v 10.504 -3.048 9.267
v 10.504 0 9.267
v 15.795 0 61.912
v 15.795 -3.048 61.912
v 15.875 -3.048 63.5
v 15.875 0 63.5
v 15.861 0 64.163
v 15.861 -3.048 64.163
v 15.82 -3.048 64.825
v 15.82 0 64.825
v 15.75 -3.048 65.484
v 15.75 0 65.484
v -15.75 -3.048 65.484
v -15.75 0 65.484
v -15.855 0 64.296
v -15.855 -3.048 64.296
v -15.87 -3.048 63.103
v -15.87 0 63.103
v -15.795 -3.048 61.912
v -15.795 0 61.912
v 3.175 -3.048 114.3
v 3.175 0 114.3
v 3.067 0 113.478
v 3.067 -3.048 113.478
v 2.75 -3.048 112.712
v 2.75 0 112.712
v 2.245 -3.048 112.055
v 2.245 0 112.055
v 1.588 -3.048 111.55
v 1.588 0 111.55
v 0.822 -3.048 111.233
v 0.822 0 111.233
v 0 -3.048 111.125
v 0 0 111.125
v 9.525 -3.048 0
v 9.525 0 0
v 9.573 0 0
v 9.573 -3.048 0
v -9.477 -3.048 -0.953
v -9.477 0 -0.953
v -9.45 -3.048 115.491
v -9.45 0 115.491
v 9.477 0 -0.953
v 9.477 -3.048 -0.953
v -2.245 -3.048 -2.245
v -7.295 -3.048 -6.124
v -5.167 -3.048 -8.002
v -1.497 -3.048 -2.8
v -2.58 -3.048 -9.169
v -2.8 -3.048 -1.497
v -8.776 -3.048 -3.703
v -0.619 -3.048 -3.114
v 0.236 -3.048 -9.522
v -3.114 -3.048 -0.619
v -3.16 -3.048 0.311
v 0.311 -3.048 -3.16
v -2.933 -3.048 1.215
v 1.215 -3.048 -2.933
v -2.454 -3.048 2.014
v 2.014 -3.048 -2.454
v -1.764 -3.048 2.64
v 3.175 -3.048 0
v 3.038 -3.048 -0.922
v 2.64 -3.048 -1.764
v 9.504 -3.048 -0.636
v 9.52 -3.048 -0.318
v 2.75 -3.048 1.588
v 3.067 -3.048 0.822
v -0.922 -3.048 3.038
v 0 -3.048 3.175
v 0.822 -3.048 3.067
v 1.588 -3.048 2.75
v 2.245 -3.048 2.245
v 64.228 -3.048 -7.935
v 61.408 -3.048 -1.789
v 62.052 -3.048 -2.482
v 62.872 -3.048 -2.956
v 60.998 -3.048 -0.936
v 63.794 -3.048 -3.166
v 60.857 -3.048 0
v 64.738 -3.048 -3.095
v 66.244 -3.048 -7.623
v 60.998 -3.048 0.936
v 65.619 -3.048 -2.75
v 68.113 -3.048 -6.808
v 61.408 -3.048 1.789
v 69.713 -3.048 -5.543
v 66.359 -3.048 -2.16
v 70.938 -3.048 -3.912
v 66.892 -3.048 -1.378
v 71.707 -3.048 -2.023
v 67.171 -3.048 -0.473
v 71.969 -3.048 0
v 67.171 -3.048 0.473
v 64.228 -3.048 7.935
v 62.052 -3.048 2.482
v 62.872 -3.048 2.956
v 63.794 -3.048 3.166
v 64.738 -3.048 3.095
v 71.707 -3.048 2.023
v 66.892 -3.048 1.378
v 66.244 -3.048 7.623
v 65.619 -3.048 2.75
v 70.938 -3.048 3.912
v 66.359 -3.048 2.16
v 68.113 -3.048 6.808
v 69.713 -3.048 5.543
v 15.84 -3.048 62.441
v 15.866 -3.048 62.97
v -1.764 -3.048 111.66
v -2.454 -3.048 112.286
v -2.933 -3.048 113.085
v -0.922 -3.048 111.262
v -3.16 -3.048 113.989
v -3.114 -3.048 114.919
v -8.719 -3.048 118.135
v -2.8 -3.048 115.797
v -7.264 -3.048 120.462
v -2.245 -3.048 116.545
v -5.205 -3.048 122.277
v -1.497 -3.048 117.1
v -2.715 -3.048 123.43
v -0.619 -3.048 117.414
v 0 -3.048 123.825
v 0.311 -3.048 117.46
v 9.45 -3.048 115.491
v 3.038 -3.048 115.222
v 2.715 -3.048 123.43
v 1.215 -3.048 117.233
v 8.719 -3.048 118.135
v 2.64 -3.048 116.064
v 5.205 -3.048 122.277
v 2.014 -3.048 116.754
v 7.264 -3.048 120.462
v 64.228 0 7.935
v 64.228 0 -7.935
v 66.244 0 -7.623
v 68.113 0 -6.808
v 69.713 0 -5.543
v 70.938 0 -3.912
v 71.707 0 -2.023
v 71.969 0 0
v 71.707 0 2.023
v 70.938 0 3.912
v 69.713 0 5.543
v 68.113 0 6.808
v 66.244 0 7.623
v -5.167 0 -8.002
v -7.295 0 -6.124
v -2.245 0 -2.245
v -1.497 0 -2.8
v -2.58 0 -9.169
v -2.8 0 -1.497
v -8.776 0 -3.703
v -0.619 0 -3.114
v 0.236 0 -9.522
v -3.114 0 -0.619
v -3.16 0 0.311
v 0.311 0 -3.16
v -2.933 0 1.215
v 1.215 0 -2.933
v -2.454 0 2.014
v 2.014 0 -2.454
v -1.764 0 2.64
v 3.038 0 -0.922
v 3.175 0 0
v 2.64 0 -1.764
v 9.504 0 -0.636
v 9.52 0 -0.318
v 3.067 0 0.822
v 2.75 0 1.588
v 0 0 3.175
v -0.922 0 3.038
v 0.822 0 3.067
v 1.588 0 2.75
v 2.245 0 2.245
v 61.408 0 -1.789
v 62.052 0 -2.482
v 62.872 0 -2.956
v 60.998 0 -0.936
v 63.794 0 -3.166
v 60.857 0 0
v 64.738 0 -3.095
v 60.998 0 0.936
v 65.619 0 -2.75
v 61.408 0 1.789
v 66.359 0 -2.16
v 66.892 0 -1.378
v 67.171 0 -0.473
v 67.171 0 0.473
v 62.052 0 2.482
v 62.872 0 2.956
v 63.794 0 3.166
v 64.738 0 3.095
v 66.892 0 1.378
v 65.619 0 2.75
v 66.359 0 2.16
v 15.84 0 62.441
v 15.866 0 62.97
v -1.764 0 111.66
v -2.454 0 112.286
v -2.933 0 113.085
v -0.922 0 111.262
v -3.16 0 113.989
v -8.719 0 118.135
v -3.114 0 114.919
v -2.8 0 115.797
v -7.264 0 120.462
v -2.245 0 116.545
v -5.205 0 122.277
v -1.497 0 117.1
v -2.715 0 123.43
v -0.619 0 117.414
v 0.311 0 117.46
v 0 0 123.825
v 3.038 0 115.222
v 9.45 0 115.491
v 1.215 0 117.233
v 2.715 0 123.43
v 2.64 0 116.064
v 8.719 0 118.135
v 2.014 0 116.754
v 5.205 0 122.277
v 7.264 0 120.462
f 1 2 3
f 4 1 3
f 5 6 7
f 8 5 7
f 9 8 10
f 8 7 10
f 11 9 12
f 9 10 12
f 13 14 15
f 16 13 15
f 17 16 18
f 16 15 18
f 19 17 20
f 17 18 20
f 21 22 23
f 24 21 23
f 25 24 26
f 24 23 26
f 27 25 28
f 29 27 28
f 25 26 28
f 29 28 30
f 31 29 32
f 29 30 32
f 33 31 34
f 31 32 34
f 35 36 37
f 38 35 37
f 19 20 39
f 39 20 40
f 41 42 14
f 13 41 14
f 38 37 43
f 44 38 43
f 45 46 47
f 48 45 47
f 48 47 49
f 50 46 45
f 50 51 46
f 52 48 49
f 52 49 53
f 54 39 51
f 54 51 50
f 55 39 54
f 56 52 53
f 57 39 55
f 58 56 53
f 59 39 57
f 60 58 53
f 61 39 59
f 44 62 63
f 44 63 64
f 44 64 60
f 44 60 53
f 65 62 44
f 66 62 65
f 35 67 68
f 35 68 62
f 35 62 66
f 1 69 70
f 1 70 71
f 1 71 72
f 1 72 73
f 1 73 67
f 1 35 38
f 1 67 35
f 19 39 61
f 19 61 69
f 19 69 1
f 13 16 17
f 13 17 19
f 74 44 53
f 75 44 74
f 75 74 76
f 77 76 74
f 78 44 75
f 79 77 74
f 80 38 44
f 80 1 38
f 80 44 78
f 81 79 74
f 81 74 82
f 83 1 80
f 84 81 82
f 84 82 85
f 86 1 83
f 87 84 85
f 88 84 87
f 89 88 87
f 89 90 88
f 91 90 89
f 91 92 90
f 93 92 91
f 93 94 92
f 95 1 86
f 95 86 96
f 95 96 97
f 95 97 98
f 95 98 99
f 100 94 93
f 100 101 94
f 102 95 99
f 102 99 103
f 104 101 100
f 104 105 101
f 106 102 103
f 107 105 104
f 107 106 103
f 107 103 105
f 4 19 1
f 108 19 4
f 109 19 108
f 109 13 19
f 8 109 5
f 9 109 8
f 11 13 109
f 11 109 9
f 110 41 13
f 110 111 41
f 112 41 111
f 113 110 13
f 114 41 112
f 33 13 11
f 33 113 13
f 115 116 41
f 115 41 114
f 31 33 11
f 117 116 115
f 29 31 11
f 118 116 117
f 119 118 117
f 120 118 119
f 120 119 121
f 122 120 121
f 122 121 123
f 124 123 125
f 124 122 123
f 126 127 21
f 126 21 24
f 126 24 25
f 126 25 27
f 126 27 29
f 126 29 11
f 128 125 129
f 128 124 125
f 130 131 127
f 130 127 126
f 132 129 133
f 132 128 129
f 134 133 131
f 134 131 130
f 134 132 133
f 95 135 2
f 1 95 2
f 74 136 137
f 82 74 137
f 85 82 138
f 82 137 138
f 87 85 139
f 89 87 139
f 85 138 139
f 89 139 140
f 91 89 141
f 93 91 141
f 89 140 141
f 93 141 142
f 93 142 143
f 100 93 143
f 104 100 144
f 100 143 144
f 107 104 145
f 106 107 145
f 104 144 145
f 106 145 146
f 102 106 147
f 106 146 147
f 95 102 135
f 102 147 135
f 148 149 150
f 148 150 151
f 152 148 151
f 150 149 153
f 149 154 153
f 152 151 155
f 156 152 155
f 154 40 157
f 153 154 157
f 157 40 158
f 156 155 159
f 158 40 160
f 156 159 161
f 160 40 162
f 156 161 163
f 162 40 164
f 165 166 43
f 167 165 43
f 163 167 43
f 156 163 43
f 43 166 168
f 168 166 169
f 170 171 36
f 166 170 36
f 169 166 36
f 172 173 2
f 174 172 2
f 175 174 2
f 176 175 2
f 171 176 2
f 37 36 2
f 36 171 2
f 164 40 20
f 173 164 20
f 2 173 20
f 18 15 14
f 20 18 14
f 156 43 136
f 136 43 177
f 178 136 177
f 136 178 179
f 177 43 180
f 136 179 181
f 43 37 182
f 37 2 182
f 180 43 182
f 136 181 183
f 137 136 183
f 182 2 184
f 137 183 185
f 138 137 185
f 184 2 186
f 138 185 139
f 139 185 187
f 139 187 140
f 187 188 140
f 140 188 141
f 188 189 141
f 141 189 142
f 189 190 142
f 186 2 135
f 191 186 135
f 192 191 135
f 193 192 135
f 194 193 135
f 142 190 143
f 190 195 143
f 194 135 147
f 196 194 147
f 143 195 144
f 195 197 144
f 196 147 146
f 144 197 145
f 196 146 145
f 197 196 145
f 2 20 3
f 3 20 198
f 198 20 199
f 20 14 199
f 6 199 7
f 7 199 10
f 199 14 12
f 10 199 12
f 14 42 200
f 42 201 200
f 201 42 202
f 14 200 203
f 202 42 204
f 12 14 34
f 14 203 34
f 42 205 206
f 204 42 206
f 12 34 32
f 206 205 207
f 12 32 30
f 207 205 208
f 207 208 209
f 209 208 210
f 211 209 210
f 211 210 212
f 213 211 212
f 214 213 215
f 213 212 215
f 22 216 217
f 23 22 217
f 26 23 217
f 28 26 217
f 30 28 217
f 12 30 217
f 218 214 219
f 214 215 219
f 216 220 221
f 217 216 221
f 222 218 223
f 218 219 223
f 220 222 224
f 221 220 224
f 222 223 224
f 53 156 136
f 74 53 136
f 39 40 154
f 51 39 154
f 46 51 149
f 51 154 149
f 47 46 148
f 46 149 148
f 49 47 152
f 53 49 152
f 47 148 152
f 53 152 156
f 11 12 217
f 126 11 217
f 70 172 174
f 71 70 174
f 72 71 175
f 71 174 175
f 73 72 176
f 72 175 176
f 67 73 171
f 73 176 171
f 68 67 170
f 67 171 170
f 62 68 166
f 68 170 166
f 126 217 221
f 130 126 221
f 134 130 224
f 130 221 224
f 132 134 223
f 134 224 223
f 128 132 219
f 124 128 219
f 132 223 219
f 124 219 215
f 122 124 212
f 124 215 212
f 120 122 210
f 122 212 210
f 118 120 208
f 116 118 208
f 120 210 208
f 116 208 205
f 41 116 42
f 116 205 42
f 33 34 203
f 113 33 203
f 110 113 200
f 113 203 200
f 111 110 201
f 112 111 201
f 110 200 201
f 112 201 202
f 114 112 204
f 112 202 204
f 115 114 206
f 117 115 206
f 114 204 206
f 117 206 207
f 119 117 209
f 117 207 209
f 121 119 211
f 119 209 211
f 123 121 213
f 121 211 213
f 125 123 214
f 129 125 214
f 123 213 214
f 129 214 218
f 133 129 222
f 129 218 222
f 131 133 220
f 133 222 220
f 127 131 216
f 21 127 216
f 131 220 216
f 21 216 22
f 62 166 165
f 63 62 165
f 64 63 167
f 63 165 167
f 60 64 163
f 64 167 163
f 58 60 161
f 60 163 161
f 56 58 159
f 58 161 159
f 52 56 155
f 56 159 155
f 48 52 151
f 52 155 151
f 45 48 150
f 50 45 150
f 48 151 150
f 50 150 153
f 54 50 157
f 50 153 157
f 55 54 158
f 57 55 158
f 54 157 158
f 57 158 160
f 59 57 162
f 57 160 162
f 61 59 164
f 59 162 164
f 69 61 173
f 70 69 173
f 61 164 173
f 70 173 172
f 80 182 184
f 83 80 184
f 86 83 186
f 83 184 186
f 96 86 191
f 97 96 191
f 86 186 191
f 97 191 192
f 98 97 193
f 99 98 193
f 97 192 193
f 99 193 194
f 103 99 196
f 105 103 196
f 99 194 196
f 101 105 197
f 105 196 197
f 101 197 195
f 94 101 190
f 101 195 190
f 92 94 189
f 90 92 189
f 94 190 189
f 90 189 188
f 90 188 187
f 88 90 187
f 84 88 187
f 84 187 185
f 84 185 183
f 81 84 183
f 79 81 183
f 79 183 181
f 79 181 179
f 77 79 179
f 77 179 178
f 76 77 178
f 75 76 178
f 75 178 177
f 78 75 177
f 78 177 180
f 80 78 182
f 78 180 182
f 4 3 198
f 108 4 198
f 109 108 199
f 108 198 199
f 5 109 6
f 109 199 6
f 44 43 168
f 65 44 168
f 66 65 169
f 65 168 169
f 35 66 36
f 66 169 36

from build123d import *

# Parameters (mm, degrees)
F1_DEPTH = 3.048


with BuildPart() as f1:
    # F0 (on Front) → F1 (new body)
    with BuildSketch(Plane.XZ):
        with BuildLine():
            Line((0, 79.375), (0, 104.775))
            ThreePointArc((0, 104.775), (-7.14375, 107.9998046905), (-9.4502929642, 115.490625))
            Line((-9.4502929642, 115.490625), (-15.7504882737, 65.484375))
            ThreePointArc((-15.7504882737, 65.484375), (-10.5003255158, 75.40625), (0, 79.375))
        make_face()
        with BuildLine():
            ThreePointArc((9.525, 114.3), (6.7351920908, 107.5648079092), (0, 104.775))
            Line((0, 104.775), (0, 79.375))
            ThreePointArc((0, 79.375), (10.5003255158, 75.40625), (15.7504882737, 65.484375))
            Line((15.7504882737, 65.484375), (9.4502929642, 115.490625))
            ThreePointArc((9.4502929642, 115.490625), (9.5063048942, 114.896483242), (9.525, 114.3))
        make_face()
        with BuildLine():
            ThreePointArc((15.7504882737, 65.484375), (10.5003255158, 75.40625), (0, 79.375))
            Line((0, 79.375), (0, 47.625))
            ThreePointArc((0, 47.625), (10.6492737428, 51.7267849017), (15.7954255641, 61.9125))
            ThreePointArc((15.7954255641, 61.9125), (15.8550939106, 62.7052534459), (15.875, 63.5))
            ThreePointArc((15.875, 63.5), (15.8438414904, 64.4941387366), (15.7504882737, 65.484375))
        make_face()
        with BuildLine():
            Line((0, 47.625), (0, 79.375))
            ThreePointArc((0, 79.375), (-10.5003255158, 75.40625), (-15.7504882737, 65.484375))
            ThreePointArc((-15.7504882737, 65.484375), (-15.8737438155, 63.6997054867), (-15.7954255641, 61.9125))
            ThreePointArc((-15.7954255641, 61.9125), (-10.6492737428, 51.7267849017), (0, 47.625))
        make_face()
        with BuildLine():
            Line((0, 9.525), (0, 47.625))
            ThreePointArc((0, 47.625), (-10.6492737428, 51.7267849017), (-15.7954255641, 61.9125))
            Line((-15.7954255641, 61.9125), (-9.4772553384, -0.9525))
            ThreePointArc((-9.4772553384, -0.9525), (-7.063929059, 6.3895642457), (0, 9.525))
        make_face()
        with BuildLine():
            ThreePointArc((-9.4502929642, 115.490625), (-7.14375, 107.9998046905), (0, 104.775))
            ThreePointArc((0, 104.775), (6.7351920908, 107.5648079092), (9.525, 114.3))
            ThreePointArc((9.525, 114.3), (9.5063048942, 114.896483242), (9.4502929642, 115.490625))
            ThreePointArc((9.4502929642, 115.490625), (0, 123.825), (-9.4502929642, 115.490625))
        make_face()
        with BuildLine():
            ThreePointArc((3.175, 114.3), (2.2450640303, 112.0549359697), (0, 111.125))
            ThreePointArc((0, 111.125), (-2.2450640303, 116.5450640303), (3.175, 114.3))
        make_face(mode=Mode.SUBTRACT)
        with BuildLine():
            ThreePointArc((71.9691688256, 0), (69.7134786398, 5.5426476963), (64.228458656, 7.935060177))
            ThreePointArc((64.228458656, 7.935060177), (58.4890211293, 5.6818098142), (56.0941688256, 0))
            ThreePointArc((56.0941688256, 0), (58.4890211293, -5.6818098142), (64.228458656, -7.935060177))
            ThreePointArc((64.228458656, -7.935060177), (69.7134786398, -5.5426476963), (71.9691688256, 0))
        make_face()
        with BuildLine():
            ThreePointArc((67.2066688256, 0), (64.0316688256, -3.175), (60.8566688256, 0))
            ThreePointArc((60.8566688256, 0), (64.0316688256, 3.175), (67.2066688256, 0))
        make_face(mode=Mode.SUBTRACT)
        with BuildLine():
            ThreePointArc((15.7954255641, 61.9125), (10.6492737428, 51.7267849017), (0, 47.625))
            Line((0, 47.625), (0, 9.525))
            ThreePointArc((0, 9.525), (0.1180829727, 9.524268025), (0.2361477965, 9.5220722124))
            Line((0.2361477965, 9.5220722124), (10.5043958672, 9.2674192228))
            Line((10.5043958672, 9.2674192228), (15.7954255641, 61.9125))
        make_face()
        with BuildLine():
            Line((10.5043958672, 9.2674192228), (0.2361477965, 9.5220722124))
            ThreePointArc((0.2361477965, 9.5220722124), (6.818171777, 6.6511772356), (9.525, 0))
            Line((9.525, 0), (9.5729851903, 0))
            Line((9.5729851903, 0), (10.5043958672, 9.2674192228))
        make_face()
        with BuildLine():
            ThreePointArc((9.4772553384, -0.9525), (6.4766458983, -6.9841737456), (0.2361477965, -9.5220722124))
            Line((0.2361477965, -9.5220722124), (64.228458656, -7.935060177))
            ThreePointArc((64.228458656, -7.935060177), (58.4890211293, -5.6818098142), (56.0941688256, 0))
            Line((56.0941688256, 0), (9.5729851903, 0))
            Line((9.5729851903, 0), (9.4772553384, -0.9525))
        make_face()
        with BuildLine():
            Line((0, 3.175), (0, 9.525))
            ThreePointArc((0, 9.525), (-7.063929059, 6.3895642457), (-9.4772553384, -0.9525))
            ThreePointArc((-9.4772553384, -0.9525), (-6.3015005456, -7.1425986779), (0.2361477965, -9.5220722124))
            ThreePointArc((0.2361477965, -9.5220722124), (6.4766458983, -6.9841737456), (9.4772553384, -0.9525))
            ThreePointArc((9.4772553384, -0.9525), (9.5130563464, -0.4768479324), (9.525, 0))
            Line((9.525, 0), (3.175, 0))
            ThreePointArc((3.175, 0), (-2.2450640303, -2.2450640303), (0, 3.175))
        make_face()
        with BuildLine():
            ThreePointArc((0.2361477965, 9.5220722124), (0.1180829727, 9.524268025), (0, 9.525))
            Line((0, 9.525), (0, 3.175))
            ThreePointArc((0, 3.175), (2.2450640303, 2.2450640303), (3.175, 0))
            Line((3.175, 0), (9.525, 0))
            ThreePointArc((9.525, 0), (6.818171777, 6.6511772356), (0.2361477965, 9.5220722124))
        make_face()
        with BuildLine():
            Line((64.228458656, 7.935060177), (10.5043958672, 9.2674192228))
            Line((10.5043958672, 9.2674192228), (9.5729851903, 0))
            Line((9.5729851903, 0), (56.0941688256, 0))
            ThreePointArc((56.0941688256, 0), (58.4890211293, 5.6818098142), (64.228458656, 7.935060177))
        make_face()
    extrude(amount=F1_DEPTH)


solid = f1.part
